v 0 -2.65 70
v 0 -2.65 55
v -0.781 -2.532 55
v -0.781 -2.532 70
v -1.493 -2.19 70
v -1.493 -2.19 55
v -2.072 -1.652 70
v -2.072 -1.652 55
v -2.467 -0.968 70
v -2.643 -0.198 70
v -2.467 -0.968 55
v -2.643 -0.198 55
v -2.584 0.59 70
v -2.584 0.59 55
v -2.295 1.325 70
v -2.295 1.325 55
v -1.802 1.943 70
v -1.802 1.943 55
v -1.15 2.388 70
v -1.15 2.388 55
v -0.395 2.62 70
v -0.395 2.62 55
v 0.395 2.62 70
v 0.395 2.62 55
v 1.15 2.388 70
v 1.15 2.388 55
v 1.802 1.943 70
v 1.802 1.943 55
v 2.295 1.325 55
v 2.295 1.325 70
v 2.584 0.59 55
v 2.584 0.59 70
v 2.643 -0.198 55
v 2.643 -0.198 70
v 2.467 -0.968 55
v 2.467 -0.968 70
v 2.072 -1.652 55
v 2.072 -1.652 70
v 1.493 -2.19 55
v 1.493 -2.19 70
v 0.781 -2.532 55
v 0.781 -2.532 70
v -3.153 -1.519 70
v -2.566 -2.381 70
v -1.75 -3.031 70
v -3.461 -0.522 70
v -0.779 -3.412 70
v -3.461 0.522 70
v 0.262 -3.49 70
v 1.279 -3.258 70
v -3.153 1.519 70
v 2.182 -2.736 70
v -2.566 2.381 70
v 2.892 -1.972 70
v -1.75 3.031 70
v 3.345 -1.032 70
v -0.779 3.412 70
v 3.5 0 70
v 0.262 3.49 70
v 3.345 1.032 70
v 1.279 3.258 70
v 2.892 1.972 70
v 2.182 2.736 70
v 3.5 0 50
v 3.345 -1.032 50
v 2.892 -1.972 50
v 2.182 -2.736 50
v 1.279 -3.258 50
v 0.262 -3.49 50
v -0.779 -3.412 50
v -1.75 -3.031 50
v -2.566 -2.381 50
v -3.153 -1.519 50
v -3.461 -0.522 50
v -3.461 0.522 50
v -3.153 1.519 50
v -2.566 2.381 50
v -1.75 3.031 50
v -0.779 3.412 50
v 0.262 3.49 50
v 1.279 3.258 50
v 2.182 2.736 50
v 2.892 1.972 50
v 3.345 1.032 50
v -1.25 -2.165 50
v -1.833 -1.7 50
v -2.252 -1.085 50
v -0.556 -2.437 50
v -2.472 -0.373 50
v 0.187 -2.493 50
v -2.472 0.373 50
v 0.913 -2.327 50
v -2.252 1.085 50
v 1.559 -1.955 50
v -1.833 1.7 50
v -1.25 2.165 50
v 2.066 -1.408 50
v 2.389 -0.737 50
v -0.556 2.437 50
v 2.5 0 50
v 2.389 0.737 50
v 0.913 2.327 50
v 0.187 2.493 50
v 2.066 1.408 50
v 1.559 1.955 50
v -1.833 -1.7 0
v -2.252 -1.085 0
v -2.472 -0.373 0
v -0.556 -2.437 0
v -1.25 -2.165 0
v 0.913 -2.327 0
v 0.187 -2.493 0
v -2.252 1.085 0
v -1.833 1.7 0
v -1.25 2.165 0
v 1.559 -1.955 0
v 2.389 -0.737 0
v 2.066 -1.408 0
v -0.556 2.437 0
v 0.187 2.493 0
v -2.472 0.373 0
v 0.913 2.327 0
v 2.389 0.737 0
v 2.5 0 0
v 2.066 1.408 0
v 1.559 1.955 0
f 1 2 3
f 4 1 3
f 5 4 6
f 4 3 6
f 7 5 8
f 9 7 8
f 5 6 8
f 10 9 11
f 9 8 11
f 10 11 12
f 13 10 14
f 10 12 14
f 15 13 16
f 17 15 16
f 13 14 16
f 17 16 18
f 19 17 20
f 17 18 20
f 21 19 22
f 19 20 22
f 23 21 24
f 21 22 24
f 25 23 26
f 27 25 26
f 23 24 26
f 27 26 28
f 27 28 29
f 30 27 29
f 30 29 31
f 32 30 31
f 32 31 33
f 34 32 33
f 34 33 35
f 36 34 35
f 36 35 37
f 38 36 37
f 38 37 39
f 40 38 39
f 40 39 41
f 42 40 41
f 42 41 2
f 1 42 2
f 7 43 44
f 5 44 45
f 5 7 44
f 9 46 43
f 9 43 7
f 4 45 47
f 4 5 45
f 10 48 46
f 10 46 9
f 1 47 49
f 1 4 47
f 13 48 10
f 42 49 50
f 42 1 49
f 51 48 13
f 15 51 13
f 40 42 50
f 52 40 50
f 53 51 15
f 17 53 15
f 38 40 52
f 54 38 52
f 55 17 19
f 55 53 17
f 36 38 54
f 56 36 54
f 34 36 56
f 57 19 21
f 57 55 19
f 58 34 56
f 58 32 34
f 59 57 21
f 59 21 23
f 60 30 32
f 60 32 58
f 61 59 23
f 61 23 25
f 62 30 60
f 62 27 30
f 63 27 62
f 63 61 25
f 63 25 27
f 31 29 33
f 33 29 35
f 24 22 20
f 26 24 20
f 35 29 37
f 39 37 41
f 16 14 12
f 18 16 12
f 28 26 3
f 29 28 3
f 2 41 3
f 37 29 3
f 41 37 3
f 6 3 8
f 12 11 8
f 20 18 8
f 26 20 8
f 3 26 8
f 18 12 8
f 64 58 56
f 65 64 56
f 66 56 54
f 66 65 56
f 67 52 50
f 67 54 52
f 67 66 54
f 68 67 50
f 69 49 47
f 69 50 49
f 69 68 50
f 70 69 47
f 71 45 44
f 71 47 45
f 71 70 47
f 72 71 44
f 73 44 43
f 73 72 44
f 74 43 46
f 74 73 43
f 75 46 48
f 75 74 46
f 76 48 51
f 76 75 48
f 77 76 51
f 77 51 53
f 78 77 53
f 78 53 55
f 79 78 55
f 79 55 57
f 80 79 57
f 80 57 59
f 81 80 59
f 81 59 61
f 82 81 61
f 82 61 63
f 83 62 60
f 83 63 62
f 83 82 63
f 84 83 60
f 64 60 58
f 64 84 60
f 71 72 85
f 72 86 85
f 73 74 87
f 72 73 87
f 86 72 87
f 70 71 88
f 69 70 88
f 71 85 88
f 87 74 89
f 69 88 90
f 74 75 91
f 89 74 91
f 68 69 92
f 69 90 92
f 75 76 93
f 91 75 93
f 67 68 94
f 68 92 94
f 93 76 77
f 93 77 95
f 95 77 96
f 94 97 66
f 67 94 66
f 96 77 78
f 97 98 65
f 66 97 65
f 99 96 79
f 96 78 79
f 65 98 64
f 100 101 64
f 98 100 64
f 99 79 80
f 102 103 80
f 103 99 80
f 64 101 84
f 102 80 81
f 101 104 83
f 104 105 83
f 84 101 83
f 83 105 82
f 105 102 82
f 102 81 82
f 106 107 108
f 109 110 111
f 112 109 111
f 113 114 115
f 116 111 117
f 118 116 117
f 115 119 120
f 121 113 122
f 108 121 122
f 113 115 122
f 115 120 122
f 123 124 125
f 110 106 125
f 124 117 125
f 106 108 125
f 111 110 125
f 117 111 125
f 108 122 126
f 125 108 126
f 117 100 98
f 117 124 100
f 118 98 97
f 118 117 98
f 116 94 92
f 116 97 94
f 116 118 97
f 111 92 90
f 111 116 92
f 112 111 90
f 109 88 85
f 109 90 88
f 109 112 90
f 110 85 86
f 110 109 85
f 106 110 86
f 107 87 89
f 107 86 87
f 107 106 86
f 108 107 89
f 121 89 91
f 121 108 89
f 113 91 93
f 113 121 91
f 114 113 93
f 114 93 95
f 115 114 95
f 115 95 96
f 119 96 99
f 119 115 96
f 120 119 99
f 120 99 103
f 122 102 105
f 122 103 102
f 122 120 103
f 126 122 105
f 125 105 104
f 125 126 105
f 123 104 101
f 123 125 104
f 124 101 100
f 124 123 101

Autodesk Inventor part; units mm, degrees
ref_plane "YZ Plane" through (0, 0, 0) normal (1, 0, 0) x (0, 1, 0)
ref_plane "XZ Plane" through (0, 0, 0) normal (0, 1, 0) x (-1, 0, 0)
ref_plane "XY Plane" through (0, 0, 0) normal (0, 0, 1) x (1, 0, 0)
sketch "Sketch1" plane through (0, 0, 0) normal (0, 0, 1) x (1, 0, 0)
  circle A0 centre (0, 0) radius 2.5
  dimension "d0" = 5
extrude "Extrusion1" add sketch "Sketch1" along normal blind 50
sketch "Sketch2" plane through (0, 0, 50) normal (0, 0, 1) x (1, 0, 0)
  circle A0 centre (0, 0) radius 3.5
  dimension "d3" = 7
extrude "Extrusion2" add sketch "Sketch2" along normal blind 20
sketch "Sketch3" plane through (0, 0, 70) normal (0, 0, 1) x (1, 0, 0)
  point P0 (0, 0)
  point P1 (0, 0)
hole "Hole1" at (0, 0, 70) direction (0, 0, -1) diameter 5.3 depth 15
equation "\"fitTol\" = 0.3"
properties part number "RCPlaneConnectorTest"
